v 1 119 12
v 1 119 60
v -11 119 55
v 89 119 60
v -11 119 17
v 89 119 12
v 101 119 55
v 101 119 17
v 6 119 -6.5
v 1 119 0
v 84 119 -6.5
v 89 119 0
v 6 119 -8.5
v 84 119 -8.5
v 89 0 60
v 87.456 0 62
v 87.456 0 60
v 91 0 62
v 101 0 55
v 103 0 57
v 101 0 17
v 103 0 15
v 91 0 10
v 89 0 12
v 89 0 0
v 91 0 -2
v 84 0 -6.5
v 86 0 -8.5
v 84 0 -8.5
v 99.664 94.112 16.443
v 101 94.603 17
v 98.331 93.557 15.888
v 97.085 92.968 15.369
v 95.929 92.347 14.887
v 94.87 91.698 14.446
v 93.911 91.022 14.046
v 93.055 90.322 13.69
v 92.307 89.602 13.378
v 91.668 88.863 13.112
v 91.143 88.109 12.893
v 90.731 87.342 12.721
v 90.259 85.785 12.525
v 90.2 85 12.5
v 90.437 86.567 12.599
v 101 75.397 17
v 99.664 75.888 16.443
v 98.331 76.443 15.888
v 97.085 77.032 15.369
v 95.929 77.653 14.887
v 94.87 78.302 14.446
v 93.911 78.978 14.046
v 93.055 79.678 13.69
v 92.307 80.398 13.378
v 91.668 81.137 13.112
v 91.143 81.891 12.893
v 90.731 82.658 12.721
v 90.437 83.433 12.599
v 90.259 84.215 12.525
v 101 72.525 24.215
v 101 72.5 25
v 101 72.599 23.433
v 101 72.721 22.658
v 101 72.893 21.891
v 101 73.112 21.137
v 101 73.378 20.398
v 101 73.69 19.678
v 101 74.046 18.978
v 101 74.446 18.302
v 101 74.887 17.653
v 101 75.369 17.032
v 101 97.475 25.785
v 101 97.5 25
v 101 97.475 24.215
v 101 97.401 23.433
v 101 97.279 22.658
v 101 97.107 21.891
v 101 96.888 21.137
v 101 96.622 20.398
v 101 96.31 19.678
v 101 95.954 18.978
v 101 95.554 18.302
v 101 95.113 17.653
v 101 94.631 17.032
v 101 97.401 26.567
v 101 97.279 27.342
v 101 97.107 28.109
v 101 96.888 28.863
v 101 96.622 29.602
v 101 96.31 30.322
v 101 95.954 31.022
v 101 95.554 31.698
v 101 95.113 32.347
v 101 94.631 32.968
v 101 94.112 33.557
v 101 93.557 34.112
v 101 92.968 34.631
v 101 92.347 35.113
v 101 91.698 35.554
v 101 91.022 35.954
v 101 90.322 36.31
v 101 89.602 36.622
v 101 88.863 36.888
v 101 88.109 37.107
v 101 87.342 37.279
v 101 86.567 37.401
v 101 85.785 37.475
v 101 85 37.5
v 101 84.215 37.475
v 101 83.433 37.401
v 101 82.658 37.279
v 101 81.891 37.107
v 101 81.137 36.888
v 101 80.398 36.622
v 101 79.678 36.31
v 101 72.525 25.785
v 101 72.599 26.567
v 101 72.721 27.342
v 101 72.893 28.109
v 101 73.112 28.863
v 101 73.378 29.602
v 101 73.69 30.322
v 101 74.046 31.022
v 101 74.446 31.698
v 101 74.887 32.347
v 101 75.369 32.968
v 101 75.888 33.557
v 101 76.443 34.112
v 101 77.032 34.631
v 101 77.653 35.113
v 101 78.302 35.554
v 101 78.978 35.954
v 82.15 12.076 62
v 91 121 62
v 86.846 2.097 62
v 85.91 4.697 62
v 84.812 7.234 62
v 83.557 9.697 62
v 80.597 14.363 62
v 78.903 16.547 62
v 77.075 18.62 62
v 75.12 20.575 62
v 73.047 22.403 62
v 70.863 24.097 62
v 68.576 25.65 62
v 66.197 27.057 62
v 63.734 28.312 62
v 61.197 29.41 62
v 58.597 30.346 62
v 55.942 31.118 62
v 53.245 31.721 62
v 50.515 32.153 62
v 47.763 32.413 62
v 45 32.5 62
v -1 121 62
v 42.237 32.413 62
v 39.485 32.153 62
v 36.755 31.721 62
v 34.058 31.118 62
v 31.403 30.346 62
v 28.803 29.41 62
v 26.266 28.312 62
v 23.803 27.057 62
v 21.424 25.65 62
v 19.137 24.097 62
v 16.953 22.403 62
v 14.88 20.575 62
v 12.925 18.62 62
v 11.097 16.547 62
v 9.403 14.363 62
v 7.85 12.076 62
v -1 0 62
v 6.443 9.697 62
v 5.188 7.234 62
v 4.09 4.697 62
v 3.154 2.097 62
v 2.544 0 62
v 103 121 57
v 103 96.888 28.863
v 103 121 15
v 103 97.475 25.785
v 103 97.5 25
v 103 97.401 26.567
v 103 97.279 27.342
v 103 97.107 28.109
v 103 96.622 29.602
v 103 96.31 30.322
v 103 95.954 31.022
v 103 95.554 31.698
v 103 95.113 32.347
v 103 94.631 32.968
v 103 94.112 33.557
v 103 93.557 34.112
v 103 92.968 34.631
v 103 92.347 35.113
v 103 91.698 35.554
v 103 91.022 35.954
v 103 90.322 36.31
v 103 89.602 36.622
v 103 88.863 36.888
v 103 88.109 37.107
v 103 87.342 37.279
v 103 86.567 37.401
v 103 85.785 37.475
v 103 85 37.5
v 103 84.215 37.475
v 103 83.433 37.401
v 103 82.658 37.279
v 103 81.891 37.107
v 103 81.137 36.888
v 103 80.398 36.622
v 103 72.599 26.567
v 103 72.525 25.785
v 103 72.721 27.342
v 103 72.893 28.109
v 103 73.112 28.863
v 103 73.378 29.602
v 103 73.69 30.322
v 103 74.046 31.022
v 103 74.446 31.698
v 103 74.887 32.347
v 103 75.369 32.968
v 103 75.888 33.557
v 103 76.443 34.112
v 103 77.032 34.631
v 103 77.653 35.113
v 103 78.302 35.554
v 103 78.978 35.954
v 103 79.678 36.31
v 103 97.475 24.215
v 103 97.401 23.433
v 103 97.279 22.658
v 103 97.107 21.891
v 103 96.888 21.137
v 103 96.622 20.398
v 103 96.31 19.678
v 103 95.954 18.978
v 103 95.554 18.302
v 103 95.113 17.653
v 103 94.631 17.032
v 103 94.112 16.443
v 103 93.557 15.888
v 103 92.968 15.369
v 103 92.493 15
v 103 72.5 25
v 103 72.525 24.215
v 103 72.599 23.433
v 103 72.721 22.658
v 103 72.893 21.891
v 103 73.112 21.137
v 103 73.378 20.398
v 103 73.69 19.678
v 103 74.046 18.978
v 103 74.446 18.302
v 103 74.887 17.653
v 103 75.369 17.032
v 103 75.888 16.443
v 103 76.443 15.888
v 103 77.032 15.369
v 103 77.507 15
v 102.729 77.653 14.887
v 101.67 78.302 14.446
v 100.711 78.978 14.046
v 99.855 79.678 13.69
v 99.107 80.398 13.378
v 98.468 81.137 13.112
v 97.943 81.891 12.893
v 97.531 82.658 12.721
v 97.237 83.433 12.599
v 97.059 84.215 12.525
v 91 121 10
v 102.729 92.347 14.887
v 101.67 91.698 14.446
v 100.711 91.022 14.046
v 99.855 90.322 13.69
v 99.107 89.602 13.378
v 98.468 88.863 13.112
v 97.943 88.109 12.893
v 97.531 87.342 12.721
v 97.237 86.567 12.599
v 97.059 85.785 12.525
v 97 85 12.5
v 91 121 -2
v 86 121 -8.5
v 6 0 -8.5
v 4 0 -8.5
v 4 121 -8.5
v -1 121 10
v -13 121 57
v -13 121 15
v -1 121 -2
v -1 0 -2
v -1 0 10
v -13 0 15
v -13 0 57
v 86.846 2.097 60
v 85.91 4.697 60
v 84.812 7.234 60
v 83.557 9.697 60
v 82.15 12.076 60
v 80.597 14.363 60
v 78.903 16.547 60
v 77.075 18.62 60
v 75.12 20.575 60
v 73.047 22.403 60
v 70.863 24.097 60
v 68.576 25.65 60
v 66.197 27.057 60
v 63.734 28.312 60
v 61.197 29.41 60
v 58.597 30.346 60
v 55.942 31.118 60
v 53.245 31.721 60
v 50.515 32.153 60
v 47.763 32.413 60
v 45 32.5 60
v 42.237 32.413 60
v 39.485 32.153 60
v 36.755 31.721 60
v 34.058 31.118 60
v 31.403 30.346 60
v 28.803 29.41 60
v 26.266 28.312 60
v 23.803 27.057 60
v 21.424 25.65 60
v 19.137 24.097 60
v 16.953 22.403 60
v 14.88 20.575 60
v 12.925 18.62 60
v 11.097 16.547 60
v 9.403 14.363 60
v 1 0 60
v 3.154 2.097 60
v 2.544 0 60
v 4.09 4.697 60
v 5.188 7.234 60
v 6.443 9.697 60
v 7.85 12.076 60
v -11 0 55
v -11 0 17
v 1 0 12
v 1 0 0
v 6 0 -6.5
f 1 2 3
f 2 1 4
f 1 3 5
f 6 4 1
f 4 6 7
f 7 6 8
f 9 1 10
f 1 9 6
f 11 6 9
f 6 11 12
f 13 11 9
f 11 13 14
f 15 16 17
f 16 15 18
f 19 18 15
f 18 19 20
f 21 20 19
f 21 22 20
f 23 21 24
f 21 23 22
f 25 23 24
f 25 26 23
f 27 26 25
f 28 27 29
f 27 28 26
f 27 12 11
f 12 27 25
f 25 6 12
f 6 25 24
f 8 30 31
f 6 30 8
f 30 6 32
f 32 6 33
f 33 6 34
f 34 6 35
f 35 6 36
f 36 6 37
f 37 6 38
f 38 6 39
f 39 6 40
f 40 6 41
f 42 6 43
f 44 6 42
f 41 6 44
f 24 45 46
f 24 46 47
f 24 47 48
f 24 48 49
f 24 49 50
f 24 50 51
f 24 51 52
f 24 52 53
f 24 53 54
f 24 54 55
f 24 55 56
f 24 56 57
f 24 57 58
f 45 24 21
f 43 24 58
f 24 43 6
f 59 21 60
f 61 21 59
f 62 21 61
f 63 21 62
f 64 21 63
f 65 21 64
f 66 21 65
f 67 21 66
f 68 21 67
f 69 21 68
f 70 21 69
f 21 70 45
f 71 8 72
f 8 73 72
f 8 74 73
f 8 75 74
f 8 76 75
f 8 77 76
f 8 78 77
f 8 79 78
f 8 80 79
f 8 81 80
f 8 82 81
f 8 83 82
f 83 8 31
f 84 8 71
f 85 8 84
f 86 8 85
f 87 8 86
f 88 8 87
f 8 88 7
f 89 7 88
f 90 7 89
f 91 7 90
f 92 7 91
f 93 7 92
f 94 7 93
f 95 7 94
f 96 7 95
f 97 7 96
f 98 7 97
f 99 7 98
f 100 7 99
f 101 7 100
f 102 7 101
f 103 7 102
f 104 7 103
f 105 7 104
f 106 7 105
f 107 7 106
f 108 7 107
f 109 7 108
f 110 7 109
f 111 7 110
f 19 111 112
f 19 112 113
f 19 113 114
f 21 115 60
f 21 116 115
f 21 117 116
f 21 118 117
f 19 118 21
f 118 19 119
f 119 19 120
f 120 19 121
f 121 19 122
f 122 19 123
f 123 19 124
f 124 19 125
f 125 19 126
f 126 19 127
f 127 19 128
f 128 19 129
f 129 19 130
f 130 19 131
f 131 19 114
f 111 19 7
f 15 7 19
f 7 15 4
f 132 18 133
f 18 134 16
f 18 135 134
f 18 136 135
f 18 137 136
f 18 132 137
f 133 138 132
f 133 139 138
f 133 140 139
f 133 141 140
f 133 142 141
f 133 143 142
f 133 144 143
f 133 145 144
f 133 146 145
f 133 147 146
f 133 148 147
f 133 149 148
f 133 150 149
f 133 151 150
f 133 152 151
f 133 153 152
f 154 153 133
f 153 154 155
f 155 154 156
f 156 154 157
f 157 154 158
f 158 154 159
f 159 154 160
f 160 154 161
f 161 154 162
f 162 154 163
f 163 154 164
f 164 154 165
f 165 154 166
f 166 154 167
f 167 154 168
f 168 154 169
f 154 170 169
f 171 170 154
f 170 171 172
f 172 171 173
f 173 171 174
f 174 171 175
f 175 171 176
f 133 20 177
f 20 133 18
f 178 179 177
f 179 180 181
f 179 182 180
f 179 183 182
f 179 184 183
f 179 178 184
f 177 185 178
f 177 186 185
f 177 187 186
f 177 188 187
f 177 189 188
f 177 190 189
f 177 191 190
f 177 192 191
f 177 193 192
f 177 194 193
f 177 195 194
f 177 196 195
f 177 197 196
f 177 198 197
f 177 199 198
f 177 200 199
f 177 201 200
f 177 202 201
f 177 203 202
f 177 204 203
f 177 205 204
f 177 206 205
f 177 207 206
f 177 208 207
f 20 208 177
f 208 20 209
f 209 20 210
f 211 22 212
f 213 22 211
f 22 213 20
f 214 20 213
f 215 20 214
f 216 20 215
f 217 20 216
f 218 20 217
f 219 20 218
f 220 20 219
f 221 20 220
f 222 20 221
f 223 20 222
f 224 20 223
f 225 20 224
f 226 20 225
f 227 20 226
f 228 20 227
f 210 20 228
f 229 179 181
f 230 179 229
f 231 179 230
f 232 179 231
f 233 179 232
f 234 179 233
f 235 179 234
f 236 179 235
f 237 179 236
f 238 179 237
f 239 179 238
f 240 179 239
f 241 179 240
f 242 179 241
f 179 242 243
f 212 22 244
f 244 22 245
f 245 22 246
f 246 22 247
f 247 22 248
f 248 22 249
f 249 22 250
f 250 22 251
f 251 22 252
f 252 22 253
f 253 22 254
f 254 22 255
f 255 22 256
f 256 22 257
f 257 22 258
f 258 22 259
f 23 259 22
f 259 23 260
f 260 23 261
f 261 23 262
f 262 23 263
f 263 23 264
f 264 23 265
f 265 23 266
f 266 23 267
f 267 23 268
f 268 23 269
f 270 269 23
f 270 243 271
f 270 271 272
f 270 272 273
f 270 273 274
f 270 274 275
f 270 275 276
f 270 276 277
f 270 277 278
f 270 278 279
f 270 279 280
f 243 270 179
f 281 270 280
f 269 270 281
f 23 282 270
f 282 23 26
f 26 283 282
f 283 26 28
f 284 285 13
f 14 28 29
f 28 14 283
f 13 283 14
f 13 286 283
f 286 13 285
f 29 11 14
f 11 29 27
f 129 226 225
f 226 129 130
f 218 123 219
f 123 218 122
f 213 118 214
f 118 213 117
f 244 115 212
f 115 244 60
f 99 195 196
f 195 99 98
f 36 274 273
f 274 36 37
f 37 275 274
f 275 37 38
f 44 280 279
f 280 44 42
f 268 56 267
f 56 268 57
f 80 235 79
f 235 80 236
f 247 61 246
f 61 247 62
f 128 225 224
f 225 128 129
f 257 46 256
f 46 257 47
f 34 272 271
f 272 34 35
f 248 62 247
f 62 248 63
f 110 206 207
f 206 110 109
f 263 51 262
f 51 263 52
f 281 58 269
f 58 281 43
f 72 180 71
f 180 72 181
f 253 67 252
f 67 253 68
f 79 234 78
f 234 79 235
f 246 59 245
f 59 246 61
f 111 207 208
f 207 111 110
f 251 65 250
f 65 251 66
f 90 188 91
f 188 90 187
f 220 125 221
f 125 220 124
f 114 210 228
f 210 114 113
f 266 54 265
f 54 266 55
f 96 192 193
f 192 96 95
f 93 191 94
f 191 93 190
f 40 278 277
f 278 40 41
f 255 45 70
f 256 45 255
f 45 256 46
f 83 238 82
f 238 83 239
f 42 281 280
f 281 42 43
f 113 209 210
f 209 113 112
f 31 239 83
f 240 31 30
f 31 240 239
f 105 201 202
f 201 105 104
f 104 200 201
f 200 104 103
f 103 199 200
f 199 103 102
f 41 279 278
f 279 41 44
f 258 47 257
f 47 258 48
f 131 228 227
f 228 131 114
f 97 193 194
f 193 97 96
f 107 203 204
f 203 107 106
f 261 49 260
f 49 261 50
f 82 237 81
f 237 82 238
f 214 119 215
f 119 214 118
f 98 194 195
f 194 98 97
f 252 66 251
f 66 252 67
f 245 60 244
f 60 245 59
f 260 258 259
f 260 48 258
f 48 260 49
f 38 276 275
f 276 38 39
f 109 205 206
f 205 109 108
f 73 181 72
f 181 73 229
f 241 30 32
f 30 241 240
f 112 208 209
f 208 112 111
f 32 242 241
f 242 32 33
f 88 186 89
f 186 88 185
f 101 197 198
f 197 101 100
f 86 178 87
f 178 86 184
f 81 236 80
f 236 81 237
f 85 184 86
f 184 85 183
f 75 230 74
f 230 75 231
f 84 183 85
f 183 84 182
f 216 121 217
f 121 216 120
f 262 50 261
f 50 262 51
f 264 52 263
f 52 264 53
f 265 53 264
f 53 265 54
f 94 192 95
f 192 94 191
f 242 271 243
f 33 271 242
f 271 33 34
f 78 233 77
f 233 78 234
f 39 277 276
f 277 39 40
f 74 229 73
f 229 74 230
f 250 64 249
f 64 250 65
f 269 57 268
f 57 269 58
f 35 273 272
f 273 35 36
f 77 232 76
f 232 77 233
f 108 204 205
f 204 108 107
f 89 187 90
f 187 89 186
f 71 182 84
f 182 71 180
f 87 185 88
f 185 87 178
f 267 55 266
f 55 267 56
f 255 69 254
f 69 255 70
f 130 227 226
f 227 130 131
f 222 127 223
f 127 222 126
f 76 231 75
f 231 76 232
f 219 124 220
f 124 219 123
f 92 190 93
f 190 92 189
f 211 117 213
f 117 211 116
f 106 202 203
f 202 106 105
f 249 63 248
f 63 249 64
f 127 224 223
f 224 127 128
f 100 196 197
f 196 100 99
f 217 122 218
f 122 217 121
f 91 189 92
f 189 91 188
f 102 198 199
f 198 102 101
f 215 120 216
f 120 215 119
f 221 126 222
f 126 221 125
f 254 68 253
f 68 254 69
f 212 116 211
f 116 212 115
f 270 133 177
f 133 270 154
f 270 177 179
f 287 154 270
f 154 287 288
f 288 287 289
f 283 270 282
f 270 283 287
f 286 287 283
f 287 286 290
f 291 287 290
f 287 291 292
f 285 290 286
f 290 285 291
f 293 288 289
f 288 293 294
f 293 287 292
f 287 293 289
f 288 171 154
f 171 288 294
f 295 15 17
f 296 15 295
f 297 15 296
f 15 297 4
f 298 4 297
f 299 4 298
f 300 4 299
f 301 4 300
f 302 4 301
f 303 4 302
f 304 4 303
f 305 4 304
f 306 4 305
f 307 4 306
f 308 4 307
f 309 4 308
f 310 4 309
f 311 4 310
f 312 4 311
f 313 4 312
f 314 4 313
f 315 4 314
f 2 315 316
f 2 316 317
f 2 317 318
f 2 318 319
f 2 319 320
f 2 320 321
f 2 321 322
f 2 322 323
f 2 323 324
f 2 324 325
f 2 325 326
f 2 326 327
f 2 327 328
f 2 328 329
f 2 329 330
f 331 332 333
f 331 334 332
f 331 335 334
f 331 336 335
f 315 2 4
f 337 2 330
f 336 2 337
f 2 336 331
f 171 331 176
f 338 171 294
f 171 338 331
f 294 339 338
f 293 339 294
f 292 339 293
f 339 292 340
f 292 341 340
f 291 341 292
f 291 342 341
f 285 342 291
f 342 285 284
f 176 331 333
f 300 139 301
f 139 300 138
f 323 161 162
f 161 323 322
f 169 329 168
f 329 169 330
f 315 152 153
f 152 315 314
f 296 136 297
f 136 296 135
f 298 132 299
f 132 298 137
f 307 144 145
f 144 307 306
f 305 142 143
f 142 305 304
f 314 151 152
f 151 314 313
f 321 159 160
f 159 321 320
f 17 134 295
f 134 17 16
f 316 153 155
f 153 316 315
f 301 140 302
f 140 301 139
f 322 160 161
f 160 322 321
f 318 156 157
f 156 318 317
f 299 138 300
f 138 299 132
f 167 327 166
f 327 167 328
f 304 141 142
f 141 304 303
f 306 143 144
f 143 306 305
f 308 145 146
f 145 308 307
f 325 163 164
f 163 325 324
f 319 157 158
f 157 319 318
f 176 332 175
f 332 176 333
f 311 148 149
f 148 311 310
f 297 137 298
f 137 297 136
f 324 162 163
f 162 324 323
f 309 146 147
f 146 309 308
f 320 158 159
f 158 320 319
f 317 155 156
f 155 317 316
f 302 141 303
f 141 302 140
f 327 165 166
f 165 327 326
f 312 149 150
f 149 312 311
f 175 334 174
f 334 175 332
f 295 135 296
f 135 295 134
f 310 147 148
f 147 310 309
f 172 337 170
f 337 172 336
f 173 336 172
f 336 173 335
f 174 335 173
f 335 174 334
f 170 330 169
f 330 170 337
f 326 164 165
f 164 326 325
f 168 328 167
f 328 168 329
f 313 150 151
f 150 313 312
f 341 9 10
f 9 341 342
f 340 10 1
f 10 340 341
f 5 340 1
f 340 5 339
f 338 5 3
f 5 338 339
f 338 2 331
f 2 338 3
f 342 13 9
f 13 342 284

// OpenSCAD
// file: ../../modules/copy_mirror.scad
module copy_mirror(uvec) {
  children();
  mirror(uvec) children();
}
// file: ../../modules/copy_translate.scad
module copy_translate(vec) {
  children();
  translate(vec) children();
}
// main file
use <../../modules/copy_translate.scad>
use <../../modules/copy_mirror.scad>

$fn = 100;

wall_thickness = 2;

side_wall();
translate([88 + wall_thickness, 0]) mirror([1, 0]) difference() {
  // ref: https://en.wikibooks.org/wiki/OpenSCAD_User_Manual/FAQ#Why_are_some_parts_(e.g._holes)_of_the_model_not_rendered_correctly?
  render(convexity = 2) side_wall();
  translate([-20, 85, 25]) rotate([0, 90]) cylinder(d = 25, h = 20);
}

translate([0, 119]) rear_wall();
translate([0, 0, 60]) top_wall();

module side_wall(t = wall_thickness) translate([-t / 2, 119])
  rotate([90, 0]) linear_extrude(height = 119) {
    side_wall_bottom_shape();
    side_wall_top_shape();
  };

module side_wall_bottom_shape(t = wall_thickness) {
  hull() copy_translate([0, 10]) square([t, t]);
  translate([0, -t]) hull() copy_translate([5, -t - 4.5]) square([t, t]);
}

module side_wall_top_shape(t = wall_thickness) {
  translate([0, 10]) hull() copy_translate([-12, 5]) square([t, t]);
  translate([-12, 15]) hull() copy_translate([0, 40]) square([t, t]);
  translate([-12, 55]) hull() copy_translate([12, 5]) square([t, t]);
}

module rear_wall(t = wall_thickness) translate([-t / 2, t]) {
  rear_wall_transform() side_wall_bottom_shape();
  rear_wall_transform() side_wall_top_shape();
}

module rear_wall_transform(t = wall_thickness)
  translate([88 / 2 + t, 0])
  rotate([90, 0])
  linear_extrude(height = t)
  hull()
  copy_mirror([1, 0])
  translate([-88 / 2 - t, 0])
  children();

module top_wall(t = wall_thickness) translate([-t / 2, 0]) difference() {
  width = 88 + 2 * t;

  cube([width, 119, t]);
  translate([width / 2, -11.5, -0.1]) cylinder(r = 44, h = t + 0.2);
}
